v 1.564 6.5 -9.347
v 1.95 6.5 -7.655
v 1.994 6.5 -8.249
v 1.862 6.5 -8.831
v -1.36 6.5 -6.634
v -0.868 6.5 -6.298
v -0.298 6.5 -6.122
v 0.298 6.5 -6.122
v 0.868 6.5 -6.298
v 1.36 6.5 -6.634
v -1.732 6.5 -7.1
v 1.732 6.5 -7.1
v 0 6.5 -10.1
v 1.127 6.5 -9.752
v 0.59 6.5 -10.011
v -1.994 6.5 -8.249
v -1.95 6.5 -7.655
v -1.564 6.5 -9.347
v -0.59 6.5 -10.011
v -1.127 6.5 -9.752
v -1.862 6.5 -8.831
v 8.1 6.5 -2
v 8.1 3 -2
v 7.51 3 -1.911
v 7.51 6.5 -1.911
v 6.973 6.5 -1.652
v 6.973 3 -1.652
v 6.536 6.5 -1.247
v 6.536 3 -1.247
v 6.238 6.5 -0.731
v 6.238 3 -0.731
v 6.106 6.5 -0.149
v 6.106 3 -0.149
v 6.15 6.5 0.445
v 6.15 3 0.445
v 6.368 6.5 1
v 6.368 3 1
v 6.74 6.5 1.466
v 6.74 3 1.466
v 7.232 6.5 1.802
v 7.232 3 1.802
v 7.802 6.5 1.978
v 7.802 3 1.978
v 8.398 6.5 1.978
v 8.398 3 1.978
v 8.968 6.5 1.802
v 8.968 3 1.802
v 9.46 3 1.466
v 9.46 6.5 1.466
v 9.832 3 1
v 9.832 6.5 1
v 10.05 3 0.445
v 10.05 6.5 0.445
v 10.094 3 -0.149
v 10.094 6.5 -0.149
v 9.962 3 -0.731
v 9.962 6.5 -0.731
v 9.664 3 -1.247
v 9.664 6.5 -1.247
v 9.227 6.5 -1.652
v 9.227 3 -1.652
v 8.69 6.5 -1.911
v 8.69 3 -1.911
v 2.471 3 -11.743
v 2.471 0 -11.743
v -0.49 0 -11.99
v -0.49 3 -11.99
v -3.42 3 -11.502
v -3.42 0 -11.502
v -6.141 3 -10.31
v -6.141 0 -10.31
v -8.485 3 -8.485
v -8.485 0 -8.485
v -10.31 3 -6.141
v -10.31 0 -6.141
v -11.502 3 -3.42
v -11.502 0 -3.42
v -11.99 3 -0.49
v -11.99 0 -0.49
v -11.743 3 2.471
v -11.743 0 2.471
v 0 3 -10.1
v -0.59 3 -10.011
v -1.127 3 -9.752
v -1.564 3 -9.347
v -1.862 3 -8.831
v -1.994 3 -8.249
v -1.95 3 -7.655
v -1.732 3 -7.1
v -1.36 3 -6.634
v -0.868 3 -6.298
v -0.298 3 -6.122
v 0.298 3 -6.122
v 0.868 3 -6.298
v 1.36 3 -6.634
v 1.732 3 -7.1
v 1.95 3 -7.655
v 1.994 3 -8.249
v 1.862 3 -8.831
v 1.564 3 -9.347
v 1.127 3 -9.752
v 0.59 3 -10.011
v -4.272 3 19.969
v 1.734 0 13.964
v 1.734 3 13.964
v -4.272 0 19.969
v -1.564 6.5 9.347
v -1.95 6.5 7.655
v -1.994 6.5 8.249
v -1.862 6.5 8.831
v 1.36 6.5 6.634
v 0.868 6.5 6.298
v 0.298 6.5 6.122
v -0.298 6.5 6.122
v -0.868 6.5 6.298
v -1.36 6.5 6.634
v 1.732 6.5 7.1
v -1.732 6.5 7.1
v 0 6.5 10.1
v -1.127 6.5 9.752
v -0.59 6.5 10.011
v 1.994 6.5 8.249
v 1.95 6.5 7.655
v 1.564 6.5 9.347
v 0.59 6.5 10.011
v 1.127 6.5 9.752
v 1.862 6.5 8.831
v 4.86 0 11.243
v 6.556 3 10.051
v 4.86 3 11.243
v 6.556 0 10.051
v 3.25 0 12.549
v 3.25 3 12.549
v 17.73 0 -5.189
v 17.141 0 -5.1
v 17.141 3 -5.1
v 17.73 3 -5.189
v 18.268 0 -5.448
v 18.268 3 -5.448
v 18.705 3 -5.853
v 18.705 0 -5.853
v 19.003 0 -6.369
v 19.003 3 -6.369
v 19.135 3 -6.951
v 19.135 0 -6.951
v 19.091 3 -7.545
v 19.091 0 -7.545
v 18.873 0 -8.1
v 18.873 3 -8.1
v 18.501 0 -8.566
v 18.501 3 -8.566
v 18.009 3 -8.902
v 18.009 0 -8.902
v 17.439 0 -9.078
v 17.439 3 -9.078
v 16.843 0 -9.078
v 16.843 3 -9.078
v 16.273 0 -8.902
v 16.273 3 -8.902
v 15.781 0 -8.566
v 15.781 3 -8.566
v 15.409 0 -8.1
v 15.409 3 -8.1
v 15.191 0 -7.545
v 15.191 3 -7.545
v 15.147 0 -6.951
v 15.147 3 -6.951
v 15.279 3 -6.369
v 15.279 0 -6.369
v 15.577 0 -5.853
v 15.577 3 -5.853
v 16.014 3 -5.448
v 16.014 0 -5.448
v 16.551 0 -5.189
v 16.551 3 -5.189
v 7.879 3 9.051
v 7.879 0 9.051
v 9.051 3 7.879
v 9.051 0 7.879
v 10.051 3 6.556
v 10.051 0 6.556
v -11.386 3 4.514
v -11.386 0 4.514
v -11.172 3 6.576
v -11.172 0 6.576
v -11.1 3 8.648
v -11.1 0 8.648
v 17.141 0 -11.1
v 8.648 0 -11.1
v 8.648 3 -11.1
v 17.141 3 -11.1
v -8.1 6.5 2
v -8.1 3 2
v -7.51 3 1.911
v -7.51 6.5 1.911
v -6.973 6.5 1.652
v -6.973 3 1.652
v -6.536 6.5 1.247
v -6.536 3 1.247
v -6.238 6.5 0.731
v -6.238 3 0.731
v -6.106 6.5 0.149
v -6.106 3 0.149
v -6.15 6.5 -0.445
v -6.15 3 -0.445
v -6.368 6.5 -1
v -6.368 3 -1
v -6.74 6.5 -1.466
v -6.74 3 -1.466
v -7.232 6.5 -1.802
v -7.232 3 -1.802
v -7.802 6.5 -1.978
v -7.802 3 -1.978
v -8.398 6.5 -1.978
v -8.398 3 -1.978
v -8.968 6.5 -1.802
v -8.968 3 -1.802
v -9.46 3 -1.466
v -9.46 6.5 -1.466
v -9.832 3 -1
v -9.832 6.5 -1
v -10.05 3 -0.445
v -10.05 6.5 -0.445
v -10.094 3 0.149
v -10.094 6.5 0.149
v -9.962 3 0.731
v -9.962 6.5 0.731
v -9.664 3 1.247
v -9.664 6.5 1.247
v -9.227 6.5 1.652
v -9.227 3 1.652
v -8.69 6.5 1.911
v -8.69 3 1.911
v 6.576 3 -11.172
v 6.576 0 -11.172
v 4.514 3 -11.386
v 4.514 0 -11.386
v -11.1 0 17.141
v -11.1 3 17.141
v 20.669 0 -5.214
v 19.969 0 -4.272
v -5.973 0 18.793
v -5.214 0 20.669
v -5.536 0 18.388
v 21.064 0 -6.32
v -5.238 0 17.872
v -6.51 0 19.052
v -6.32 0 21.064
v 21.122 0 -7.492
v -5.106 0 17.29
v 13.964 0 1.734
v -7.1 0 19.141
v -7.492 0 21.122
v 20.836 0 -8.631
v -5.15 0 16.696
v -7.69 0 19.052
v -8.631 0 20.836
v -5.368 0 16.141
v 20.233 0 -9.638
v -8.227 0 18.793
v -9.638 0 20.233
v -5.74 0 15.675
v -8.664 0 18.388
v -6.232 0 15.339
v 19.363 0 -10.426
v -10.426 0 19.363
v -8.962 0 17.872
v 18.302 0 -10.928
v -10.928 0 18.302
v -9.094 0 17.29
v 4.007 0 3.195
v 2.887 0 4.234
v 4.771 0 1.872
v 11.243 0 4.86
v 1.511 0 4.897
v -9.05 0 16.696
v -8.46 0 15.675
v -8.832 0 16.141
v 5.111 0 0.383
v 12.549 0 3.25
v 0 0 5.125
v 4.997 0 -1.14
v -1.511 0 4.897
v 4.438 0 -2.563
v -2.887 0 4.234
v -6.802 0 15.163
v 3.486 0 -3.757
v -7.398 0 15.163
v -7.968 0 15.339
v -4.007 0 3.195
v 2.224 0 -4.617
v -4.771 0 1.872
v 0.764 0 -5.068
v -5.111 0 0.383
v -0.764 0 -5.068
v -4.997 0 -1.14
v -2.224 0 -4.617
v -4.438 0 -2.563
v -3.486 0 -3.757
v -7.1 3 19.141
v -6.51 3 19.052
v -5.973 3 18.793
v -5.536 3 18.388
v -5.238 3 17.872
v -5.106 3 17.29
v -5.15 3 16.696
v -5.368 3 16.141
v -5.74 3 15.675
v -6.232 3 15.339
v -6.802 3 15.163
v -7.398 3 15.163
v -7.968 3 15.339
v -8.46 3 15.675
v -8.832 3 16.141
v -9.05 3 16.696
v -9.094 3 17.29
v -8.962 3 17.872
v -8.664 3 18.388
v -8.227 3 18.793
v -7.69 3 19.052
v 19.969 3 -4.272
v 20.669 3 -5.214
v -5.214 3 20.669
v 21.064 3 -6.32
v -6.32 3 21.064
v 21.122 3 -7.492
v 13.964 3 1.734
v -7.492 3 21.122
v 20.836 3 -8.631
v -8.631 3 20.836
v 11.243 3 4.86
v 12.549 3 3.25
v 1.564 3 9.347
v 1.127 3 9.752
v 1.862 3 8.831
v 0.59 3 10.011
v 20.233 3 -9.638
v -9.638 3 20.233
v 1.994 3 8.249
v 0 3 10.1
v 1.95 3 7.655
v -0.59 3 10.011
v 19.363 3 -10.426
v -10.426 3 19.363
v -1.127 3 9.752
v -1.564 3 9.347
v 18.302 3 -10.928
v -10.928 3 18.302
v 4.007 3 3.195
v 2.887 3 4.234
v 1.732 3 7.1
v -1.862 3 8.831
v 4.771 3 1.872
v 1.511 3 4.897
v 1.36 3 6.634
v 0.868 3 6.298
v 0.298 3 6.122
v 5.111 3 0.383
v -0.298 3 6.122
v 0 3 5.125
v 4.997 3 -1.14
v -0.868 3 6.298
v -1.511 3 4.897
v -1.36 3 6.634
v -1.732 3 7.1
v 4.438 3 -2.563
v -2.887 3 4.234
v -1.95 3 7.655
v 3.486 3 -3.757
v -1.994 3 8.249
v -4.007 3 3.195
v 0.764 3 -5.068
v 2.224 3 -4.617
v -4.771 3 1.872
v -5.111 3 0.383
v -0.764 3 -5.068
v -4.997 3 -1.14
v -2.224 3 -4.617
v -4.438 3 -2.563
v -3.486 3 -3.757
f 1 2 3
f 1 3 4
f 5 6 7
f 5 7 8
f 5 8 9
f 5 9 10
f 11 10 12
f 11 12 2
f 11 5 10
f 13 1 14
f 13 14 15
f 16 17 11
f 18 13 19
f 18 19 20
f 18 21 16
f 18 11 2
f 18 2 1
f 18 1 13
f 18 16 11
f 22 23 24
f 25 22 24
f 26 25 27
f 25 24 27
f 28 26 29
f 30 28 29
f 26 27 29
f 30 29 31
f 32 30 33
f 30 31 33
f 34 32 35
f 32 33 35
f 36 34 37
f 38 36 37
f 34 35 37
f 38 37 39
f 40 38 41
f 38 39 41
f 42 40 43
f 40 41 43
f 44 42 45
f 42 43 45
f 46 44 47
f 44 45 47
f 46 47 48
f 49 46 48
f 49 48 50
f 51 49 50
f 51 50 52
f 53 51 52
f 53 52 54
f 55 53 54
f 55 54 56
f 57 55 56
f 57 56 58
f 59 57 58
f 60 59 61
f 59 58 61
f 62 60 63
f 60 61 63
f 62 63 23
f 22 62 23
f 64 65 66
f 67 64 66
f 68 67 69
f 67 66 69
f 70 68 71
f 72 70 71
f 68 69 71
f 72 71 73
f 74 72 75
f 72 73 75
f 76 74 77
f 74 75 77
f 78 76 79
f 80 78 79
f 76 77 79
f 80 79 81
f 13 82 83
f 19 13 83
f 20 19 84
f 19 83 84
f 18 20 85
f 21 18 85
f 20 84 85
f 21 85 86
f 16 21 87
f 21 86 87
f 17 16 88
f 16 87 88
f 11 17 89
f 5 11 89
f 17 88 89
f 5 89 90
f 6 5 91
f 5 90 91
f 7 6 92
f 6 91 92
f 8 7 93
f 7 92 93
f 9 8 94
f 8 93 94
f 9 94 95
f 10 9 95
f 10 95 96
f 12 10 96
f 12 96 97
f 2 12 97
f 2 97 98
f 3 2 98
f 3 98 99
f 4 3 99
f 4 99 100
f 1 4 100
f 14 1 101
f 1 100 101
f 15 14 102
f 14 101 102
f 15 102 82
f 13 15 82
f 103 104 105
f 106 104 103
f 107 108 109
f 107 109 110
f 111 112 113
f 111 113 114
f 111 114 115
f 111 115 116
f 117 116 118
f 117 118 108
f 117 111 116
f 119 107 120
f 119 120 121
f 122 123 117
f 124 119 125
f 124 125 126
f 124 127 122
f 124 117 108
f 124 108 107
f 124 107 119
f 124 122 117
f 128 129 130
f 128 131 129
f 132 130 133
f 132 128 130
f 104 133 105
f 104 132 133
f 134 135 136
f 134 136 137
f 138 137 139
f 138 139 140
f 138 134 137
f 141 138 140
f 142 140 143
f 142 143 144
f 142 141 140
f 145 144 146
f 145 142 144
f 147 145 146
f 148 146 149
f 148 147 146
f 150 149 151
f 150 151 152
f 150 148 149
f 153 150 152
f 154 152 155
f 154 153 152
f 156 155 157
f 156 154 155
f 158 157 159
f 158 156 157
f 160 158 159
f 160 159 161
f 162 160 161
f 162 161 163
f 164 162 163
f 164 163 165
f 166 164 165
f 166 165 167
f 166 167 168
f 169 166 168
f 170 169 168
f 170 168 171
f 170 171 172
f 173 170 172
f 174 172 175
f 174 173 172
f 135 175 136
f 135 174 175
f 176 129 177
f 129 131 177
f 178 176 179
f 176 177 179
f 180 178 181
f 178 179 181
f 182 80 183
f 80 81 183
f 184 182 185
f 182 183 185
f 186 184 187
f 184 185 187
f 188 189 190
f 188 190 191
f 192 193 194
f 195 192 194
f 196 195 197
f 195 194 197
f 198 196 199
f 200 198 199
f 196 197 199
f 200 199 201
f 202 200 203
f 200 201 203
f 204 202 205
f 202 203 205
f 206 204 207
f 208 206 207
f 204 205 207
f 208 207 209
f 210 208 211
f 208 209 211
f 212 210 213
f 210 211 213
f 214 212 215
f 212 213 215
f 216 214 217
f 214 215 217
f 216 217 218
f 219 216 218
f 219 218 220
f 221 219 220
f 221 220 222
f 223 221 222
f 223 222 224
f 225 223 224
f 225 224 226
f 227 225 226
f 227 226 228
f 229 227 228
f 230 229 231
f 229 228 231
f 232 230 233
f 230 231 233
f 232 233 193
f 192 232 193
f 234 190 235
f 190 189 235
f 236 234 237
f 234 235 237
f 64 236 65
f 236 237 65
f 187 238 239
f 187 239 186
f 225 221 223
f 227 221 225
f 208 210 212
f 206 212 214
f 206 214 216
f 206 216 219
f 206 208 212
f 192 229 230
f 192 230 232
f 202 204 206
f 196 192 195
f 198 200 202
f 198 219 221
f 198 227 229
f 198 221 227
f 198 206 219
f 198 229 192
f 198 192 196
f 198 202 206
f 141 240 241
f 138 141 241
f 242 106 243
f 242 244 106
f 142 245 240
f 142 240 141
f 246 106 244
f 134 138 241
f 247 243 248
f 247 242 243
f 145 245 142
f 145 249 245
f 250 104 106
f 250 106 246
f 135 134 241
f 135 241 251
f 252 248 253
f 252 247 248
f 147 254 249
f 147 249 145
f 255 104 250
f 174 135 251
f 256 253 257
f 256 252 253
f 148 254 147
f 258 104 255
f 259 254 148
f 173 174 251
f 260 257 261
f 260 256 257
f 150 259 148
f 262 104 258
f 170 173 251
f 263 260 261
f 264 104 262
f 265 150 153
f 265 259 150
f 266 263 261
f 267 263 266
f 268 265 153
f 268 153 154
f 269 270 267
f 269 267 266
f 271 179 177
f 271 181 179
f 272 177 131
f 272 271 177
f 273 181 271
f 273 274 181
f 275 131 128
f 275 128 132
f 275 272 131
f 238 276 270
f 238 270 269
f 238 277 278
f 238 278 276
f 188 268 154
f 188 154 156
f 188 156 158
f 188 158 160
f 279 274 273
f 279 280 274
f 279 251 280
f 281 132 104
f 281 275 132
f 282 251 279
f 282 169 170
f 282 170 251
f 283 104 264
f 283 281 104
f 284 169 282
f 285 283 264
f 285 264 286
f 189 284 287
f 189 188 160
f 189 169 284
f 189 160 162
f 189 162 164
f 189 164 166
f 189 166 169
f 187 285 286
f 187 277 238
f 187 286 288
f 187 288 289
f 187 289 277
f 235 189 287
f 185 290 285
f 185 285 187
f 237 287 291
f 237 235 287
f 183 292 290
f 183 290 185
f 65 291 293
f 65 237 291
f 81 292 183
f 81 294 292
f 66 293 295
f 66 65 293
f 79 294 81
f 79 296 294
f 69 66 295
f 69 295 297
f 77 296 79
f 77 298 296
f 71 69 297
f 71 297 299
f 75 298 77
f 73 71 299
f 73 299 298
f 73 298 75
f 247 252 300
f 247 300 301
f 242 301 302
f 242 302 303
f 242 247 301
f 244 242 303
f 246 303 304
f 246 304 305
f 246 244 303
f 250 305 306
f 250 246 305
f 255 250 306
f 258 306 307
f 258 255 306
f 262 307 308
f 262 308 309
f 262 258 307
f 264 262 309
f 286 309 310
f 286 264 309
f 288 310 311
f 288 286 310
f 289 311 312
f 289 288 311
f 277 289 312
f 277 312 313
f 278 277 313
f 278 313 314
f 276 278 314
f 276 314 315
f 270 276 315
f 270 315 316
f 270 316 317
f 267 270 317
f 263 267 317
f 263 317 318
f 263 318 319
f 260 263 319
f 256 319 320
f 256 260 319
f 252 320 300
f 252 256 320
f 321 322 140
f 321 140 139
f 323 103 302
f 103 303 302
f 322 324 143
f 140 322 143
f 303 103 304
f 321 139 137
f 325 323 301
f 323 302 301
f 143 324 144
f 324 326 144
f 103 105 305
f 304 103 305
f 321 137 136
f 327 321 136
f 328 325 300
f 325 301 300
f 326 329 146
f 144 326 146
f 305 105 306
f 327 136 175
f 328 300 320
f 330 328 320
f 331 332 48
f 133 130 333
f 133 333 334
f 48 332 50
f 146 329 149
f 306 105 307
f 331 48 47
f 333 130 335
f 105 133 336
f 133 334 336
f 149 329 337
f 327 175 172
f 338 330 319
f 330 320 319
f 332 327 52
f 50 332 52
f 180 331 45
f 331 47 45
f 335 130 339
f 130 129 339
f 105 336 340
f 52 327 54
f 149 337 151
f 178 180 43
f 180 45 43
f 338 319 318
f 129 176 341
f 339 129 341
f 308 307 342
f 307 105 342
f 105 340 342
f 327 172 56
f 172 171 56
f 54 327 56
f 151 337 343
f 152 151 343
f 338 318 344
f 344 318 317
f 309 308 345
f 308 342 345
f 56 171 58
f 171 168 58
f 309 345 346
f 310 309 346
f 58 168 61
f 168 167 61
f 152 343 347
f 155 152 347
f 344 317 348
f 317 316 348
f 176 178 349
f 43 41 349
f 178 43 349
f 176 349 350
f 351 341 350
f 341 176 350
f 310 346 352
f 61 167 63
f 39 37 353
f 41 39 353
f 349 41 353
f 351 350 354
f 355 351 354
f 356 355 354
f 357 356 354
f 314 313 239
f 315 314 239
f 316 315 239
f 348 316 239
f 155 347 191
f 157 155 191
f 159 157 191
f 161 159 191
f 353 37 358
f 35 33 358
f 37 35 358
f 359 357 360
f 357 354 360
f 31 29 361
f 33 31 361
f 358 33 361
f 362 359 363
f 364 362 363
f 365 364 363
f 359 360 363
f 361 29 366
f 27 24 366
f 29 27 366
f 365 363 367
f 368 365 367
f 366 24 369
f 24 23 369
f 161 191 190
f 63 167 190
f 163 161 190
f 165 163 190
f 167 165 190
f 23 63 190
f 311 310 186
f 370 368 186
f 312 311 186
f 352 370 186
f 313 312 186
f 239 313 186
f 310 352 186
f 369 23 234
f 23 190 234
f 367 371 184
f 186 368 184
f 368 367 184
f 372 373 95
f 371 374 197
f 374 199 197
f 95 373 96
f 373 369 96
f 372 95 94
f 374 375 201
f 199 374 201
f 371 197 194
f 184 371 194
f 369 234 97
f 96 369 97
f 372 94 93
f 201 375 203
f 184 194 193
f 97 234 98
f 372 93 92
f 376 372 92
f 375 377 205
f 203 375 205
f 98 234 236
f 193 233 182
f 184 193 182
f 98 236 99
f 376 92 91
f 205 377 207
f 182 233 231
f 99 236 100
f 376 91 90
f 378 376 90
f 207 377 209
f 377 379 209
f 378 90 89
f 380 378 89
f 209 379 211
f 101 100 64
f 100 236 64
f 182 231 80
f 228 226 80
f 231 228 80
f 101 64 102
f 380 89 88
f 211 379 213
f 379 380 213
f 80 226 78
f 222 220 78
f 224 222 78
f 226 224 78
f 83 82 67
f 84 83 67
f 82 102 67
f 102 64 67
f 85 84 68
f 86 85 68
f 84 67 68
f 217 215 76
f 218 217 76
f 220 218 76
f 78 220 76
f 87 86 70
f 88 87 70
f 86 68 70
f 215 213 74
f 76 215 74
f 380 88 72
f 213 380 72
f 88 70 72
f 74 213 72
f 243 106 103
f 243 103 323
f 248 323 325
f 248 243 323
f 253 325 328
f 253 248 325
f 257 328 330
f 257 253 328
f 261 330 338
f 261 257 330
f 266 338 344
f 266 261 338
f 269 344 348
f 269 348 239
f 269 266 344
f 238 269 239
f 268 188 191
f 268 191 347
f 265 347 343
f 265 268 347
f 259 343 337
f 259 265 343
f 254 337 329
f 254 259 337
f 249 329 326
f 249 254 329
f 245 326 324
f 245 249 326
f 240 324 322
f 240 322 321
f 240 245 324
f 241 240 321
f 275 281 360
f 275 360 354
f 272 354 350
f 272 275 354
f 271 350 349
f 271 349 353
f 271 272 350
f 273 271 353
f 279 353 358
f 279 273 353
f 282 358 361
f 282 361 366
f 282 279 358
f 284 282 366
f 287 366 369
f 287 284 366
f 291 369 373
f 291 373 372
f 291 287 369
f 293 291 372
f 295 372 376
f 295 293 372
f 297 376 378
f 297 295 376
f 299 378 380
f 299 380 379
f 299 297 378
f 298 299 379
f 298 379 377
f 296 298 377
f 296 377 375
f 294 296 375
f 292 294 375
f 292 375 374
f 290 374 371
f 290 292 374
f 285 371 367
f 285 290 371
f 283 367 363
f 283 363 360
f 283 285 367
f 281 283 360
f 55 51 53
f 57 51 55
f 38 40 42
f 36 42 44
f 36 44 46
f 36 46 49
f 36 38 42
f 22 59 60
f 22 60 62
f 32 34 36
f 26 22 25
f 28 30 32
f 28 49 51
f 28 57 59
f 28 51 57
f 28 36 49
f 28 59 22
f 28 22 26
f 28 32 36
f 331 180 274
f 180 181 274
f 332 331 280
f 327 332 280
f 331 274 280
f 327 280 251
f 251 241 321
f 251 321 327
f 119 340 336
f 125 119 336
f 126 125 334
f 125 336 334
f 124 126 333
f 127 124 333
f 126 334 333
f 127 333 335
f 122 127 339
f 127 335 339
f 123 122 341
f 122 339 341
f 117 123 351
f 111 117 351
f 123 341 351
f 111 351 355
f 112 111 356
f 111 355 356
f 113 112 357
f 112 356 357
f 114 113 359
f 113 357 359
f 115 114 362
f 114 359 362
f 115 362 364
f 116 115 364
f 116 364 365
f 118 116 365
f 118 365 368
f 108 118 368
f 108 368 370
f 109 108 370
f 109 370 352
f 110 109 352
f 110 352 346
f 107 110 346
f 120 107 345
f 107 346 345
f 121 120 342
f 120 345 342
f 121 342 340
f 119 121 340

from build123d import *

# Parameters (mm, degrees)
SKETCH1_R           = 2
SKETCH1_R_2         = 5.125
BOSS_EXTRUDE2_DEPTH = 3
SKETCH2_R           = 2
BOSS_EXTRUDE3_DEPTH = 3.5
BOSS_EXTRUDE4_START = -3
SKETCH3_R           = 12
SKETCH3_R_2         = 11.1
BOSS_EXTRUDE4_DEPTH = 3
FILLET1_R           = 30


with BuildPart() as part:
    # Sketch1 → Boss-Extrude2 (new body)
    with BuildSketch(Plane(origin=(0, 0, 0), x_dir=(1, 0, 0), z_dir=(0, 1, 0))):
        with BuildLine():
            Line((0, 11.1), (17.140916293, 11.1))
            ThreePointArc((17.140916293, 11.1), (20.836434423, 8.630733729), (19.969343418, 4.271572875))
            Line((19.969343418, 4.271572875), (-4.271572875, -19.969343418))
            ThreePointArc((-4.271572875, -19.969343418), (-8.630733729, -20.836434423), (-11.1, -17.140916293))
            Line((-11.1, -17.140916293), (-11.1, 0))
            ThreePointArc((-11.1, 0), (-7.848885271, 7.848885271), (0, 11.1))
        make_face()
        with Locations(Location((17.140916293, 7.1, 0), (0, 0, 270))):
            Circle(SKETCH1_R, mode=Mode.SUBTRACT)
        with Locations(Location((-7.1, -17.140916293, 0), (0, 0, 270))):
            Circle(SKETCH1_R, mode=Mode.SUBTRACT)
        with Locations(Location((0, 0, 0), (0, 0, 270))):
            Circle(SKETCH1_R_2, mode=Mode.SUBTRACT)
    extrude(amount=BOSS_EXTRUDE2_DEPTH)

    # Sketch2 → Boss-Extrude3 (add)
    with BuildSketch(Plane(origin=(0, 3, 0), x_dir=(1, 0, 0), z_dir=(0, 1, 0))):
        with Locations(Location((0, -8.1, 0), (0, 0, 270))):
            Circle(SKETCH2_R)
        with Locations(Location((0, 8.1, 0), (0, 0, 90))):
            Circle(SKETCH2_R)
        with Locations(Location((8.1, 0, 0), (0, 0, 90))):
            Circle(SKETCH2_R)
        with Locations(Location((-8.1, 0, 0), (0, 0, 270))):
            Circle(SKETCH2_R)
    extrude(amount=BOSS_EXTRUDE3_DEPTH)

    # Sketch3 → Boss-Extrude4 (add)
    with BuildSketch(Plane(origin=(0, 3, 0), x_dir=(1, 0, 0), z_dir=(0, 1, 0)).offset(BOSS_EXTRUDE4_START)):
        Circle(SKETCH3_R)
        Circle(SKETCH3_R_2, mode=Mode.SUBTRACT)
    extrude(amount=BOSS_EXTRUDE4_DEPTH)

    # Fillet1
    fillet1_edges = [part.edges().sort_by_distance(p)[0] for p in [
        (4.559605246, 1.5, -11.1),
        (-11.1, 1.5, 4.559605246),
        (4.624757482, 1.5, 11.07301306),
        (11.07301306, 1.5, 4.624757482),
    ]]
    fillet(fillet1_edges, radius=FILLET1_R)


solid = part.part
